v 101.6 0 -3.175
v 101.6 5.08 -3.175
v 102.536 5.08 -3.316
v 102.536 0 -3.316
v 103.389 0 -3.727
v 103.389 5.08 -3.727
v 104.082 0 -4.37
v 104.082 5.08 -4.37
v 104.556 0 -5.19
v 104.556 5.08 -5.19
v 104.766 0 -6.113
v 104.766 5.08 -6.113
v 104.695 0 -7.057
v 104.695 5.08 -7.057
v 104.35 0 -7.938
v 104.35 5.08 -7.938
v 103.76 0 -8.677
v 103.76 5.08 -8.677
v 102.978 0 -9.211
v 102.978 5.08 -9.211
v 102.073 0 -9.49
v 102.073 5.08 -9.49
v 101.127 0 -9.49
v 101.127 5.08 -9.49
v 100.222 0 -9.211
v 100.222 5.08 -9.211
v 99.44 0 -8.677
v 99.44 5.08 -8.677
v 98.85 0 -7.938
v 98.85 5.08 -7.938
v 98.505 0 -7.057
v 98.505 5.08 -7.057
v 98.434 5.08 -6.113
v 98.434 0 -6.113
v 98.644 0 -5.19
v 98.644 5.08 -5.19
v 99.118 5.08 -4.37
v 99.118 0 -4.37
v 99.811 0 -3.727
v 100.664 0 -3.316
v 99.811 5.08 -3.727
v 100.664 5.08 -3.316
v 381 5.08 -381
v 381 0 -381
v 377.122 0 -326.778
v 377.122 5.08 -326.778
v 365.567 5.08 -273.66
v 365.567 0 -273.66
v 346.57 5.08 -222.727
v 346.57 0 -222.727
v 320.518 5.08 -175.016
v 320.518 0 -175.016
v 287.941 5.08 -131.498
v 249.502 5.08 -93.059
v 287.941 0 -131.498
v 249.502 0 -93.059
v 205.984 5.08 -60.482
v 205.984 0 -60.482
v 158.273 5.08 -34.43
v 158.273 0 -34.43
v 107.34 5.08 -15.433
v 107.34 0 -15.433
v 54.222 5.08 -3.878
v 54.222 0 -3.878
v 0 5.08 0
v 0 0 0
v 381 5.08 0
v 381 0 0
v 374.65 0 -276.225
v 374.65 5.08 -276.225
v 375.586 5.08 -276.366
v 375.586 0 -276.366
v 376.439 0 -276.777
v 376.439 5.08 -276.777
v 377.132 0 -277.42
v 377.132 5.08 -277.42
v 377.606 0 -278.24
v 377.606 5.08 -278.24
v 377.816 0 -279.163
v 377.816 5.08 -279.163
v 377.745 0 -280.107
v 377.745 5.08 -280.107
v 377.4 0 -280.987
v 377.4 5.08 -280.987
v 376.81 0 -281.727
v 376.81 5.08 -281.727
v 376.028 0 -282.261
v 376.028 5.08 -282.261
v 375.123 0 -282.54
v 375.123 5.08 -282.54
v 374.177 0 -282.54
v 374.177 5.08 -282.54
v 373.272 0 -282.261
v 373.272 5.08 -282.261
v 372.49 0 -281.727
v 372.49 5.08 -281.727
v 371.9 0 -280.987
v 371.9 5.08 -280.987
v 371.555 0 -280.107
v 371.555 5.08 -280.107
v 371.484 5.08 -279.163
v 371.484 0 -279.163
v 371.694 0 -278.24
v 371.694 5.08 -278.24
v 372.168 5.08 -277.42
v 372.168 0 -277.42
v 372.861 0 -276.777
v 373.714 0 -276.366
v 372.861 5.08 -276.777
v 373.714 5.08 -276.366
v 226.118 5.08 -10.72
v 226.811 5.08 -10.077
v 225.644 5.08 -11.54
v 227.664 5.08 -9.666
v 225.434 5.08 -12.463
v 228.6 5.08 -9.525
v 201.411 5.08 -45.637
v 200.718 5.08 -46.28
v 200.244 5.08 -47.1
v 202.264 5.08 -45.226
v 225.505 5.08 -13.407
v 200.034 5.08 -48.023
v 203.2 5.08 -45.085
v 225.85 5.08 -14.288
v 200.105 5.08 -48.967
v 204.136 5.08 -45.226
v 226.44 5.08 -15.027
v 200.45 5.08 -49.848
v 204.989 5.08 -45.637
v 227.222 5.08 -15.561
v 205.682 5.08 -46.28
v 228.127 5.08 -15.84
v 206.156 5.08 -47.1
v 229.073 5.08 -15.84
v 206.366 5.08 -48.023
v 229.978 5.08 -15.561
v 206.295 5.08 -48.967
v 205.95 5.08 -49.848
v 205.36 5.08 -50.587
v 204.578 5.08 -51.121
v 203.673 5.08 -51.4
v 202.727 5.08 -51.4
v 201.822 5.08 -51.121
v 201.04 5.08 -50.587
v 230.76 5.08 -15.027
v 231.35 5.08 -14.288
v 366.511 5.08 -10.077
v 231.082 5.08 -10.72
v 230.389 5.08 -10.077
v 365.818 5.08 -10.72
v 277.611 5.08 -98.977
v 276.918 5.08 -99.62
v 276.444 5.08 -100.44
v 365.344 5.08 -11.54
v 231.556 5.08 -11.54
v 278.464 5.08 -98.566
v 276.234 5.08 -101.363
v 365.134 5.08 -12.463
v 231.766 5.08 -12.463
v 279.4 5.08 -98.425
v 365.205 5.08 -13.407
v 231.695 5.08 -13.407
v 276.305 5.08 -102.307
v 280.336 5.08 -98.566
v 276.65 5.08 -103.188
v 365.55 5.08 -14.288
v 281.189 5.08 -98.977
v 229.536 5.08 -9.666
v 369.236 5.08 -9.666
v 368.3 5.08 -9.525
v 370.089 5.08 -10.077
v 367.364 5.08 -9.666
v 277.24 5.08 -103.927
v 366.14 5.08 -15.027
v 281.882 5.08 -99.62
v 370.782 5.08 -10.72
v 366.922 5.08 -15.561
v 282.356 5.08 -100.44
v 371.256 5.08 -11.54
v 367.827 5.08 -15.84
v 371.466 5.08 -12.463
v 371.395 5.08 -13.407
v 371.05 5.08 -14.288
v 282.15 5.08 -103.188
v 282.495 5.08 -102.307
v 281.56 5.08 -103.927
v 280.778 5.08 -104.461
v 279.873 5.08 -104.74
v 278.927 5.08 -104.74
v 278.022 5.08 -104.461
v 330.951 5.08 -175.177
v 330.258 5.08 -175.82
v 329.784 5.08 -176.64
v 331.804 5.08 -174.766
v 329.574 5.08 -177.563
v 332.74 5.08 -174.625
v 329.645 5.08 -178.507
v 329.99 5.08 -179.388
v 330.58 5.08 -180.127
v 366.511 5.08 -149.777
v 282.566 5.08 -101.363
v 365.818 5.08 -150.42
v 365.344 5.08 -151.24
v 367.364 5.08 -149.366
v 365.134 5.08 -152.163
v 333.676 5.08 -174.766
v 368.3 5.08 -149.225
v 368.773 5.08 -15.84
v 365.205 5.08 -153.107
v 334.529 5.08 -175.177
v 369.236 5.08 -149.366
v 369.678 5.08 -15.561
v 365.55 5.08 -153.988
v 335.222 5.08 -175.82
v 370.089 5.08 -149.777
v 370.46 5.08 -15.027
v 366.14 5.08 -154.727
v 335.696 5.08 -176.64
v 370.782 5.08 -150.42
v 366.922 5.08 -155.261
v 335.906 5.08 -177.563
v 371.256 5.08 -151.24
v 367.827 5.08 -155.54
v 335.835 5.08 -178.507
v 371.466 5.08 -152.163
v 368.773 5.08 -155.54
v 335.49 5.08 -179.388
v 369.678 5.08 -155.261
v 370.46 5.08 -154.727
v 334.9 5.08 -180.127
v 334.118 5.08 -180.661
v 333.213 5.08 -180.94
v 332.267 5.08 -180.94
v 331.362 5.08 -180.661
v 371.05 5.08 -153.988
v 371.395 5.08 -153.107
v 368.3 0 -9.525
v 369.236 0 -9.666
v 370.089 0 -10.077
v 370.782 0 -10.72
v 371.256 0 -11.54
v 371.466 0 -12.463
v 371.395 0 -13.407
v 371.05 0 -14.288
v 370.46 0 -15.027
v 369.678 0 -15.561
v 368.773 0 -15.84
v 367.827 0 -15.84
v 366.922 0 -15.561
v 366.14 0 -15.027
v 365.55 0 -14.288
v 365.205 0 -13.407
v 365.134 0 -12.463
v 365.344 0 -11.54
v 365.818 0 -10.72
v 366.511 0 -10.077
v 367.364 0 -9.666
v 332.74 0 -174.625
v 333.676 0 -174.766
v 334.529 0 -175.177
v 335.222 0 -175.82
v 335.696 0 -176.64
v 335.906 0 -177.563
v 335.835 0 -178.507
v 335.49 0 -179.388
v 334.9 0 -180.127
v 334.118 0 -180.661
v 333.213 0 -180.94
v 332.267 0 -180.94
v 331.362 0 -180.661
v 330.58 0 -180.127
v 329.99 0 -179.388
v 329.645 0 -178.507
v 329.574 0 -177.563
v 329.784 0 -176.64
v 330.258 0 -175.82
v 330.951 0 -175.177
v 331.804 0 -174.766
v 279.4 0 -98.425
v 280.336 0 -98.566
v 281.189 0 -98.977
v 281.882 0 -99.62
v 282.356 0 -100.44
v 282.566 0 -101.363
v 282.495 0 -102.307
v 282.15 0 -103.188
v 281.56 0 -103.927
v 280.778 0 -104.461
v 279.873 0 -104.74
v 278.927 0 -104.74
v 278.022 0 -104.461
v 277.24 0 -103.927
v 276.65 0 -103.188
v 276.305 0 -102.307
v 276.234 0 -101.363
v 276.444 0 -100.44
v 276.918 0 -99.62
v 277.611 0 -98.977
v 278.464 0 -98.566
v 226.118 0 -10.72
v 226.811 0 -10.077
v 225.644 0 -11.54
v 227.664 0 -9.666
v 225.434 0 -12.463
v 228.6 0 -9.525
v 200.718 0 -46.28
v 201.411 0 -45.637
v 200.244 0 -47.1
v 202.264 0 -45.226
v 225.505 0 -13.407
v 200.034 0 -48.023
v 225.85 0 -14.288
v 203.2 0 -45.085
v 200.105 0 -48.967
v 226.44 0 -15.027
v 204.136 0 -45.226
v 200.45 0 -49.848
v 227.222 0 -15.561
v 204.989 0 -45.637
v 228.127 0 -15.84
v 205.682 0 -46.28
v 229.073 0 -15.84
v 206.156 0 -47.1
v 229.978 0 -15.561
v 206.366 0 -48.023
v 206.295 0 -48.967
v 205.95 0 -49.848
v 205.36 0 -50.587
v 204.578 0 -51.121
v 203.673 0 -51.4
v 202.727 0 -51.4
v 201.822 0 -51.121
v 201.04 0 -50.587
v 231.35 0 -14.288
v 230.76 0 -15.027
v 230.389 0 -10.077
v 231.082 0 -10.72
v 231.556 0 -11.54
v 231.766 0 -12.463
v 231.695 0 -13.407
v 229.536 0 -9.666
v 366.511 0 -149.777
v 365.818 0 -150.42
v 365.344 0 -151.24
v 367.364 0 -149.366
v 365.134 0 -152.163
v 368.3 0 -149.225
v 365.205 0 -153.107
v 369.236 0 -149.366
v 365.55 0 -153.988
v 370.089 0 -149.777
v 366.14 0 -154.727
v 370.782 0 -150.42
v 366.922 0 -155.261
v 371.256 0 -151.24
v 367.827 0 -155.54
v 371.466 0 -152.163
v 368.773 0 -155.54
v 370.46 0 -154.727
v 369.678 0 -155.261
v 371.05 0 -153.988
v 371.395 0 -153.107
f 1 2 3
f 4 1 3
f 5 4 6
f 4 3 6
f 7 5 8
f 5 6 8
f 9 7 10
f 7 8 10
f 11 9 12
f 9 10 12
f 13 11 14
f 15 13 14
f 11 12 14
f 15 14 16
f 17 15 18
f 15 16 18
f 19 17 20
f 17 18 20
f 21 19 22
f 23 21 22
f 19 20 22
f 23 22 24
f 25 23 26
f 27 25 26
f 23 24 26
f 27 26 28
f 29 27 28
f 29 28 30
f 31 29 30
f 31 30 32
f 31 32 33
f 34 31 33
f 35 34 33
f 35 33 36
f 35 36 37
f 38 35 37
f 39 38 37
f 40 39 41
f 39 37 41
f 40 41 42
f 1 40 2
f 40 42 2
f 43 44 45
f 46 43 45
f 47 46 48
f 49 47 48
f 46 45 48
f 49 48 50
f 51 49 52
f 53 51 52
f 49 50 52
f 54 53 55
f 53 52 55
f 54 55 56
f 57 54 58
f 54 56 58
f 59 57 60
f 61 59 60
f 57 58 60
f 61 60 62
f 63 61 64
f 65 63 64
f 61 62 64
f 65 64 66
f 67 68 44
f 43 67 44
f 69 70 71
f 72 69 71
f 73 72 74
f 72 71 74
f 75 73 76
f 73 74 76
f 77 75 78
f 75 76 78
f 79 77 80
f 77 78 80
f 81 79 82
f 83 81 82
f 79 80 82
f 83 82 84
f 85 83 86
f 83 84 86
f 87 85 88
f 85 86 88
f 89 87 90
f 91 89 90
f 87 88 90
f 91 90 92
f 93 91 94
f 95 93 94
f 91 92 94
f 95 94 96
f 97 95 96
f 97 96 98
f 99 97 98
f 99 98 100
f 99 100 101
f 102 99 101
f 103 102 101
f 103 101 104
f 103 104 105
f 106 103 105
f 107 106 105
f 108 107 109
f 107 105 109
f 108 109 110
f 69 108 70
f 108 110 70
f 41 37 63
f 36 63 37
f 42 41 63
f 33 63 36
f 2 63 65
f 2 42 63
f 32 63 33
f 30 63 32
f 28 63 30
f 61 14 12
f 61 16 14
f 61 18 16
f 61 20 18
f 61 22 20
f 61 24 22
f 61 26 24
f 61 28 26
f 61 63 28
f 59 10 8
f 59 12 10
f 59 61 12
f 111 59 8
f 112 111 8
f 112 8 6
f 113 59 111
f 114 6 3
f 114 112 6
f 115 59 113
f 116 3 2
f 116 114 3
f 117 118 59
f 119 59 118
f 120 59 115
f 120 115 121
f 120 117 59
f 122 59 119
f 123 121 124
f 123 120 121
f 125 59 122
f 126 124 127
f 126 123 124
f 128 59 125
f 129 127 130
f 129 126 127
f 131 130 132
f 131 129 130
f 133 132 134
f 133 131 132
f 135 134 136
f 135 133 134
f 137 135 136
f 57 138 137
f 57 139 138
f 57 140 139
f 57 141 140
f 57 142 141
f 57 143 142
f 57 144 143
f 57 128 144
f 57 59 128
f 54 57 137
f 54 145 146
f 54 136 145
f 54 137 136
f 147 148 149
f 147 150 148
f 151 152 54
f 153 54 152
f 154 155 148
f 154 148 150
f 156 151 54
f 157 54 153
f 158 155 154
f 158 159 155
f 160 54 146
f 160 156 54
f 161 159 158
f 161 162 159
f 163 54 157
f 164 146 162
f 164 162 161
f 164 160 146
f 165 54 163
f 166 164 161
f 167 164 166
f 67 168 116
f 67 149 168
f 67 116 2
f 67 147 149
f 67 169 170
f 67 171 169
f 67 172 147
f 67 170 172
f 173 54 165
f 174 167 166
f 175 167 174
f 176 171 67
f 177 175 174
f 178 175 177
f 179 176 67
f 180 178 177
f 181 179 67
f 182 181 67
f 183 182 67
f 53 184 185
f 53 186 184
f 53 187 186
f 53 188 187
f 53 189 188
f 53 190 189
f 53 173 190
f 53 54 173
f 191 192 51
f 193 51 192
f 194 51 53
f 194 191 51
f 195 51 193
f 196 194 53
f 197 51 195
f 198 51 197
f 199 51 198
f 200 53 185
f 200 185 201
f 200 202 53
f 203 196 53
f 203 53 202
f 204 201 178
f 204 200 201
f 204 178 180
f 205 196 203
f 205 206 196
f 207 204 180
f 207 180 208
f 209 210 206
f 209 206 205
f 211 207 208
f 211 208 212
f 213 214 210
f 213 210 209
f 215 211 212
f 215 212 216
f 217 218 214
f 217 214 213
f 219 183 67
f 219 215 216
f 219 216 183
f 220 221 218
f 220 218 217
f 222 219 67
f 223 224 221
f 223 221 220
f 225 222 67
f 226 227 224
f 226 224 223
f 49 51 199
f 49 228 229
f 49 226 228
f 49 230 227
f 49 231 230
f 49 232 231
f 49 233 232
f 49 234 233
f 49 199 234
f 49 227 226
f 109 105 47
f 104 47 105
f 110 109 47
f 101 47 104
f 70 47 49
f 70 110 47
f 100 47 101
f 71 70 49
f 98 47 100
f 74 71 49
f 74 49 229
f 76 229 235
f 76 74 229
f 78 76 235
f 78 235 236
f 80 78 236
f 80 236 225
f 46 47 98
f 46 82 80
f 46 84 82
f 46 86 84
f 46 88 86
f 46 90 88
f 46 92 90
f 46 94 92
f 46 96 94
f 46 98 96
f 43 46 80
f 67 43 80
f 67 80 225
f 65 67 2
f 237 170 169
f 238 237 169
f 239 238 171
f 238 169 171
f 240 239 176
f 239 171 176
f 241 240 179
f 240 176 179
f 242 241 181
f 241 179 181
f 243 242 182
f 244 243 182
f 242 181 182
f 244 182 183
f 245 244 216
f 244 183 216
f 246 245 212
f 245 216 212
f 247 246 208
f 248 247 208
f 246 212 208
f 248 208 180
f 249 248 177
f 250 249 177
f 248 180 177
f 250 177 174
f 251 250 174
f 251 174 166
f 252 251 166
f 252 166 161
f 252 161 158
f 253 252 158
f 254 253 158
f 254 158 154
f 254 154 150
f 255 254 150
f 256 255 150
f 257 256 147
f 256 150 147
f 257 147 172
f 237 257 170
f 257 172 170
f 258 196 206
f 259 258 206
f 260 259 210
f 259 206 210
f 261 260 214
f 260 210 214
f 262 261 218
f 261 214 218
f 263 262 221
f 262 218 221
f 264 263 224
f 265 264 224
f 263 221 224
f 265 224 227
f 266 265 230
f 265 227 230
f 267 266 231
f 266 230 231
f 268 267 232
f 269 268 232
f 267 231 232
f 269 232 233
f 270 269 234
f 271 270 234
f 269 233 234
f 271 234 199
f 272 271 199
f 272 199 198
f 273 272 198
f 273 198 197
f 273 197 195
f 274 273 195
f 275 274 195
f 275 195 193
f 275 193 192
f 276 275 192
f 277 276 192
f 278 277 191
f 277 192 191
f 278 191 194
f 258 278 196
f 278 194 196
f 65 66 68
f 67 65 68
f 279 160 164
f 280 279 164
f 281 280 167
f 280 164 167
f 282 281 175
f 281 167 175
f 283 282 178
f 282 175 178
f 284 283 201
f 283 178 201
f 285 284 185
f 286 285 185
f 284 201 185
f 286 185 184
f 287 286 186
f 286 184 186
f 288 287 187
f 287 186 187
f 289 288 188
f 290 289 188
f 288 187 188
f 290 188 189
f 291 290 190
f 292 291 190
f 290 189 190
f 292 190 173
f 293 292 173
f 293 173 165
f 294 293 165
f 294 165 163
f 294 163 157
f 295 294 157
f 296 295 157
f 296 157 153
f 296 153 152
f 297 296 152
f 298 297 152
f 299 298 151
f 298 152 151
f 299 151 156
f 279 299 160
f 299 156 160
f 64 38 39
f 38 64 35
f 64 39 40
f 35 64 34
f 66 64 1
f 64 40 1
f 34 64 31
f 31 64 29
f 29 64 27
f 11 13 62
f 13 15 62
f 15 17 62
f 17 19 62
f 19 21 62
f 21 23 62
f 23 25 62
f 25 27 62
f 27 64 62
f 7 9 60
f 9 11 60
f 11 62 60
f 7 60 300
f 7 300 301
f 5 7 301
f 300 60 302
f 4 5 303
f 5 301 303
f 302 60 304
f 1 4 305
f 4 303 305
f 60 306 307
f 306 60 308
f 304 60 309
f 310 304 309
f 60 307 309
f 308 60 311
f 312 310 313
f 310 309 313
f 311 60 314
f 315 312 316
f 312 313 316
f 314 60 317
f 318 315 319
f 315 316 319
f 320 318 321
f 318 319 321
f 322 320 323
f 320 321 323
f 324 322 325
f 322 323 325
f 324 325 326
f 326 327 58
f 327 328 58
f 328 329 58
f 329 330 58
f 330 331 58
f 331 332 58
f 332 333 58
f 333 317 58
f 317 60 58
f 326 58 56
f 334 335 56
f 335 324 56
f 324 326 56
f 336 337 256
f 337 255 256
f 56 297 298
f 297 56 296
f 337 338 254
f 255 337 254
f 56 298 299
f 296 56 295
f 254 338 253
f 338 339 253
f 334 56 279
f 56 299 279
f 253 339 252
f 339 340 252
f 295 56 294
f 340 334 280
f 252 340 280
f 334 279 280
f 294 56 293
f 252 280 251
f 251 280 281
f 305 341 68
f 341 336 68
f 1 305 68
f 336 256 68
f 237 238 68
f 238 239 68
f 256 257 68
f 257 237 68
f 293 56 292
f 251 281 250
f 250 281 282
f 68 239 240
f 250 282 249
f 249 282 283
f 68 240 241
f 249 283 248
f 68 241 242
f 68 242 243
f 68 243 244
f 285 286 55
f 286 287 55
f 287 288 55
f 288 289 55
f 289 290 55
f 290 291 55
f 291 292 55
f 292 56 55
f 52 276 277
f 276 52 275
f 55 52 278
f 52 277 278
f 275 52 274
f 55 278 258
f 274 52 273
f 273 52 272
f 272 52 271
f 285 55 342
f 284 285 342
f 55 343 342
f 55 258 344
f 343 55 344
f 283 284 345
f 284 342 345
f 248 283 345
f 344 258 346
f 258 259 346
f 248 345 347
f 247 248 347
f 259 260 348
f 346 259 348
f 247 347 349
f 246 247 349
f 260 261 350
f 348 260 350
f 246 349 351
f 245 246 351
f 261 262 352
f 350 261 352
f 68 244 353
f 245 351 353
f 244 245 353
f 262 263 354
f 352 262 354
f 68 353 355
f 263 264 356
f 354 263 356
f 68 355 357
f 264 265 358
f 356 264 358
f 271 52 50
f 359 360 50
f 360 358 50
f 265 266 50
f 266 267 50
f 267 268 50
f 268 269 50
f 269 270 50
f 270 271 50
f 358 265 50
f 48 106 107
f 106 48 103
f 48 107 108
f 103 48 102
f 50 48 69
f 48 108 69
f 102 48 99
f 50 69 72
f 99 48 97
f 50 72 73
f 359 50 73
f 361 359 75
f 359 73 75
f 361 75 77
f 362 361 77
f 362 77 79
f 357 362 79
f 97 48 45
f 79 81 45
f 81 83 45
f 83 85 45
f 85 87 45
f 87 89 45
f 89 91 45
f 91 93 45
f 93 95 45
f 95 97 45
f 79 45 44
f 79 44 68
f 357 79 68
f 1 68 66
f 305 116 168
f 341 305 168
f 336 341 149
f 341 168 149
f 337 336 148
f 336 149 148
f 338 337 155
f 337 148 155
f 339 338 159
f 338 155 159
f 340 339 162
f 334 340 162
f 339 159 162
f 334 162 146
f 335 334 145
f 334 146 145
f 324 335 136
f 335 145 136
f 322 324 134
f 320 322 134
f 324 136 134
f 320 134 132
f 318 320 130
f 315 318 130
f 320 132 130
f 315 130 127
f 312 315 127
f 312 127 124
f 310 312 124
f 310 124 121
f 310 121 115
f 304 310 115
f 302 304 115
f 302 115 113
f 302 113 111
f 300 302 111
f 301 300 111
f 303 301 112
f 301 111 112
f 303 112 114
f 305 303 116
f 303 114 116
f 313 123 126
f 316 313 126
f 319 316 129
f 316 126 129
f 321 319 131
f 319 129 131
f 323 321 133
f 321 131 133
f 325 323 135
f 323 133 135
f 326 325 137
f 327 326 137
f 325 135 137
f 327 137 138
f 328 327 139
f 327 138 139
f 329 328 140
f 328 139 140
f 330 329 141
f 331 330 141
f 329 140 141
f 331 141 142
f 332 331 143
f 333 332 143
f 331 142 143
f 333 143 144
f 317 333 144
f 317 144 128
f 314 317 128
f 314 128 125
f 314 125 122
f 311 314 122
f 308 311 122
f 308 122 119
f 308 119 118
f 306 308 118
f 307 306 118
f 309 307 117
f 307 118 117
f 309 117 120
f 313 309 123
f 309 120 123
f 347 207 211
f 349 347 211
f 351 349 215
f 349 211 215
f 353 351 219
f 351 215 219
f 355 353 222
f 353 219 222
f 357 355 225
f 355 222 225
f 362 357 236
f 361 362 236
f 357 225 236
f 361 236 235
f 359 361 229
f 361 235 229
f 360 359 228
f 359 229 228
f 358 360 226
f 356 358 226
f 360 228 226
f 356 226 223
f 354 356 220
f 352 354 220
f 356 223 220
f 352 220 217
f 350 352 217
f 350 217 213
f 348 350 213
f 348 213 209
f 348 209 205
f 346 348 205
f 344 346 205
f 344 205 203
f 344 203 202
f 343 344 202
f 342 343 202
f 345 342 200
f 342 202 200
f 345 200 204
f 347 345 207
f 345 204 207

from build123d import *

# Parameters (mm, degrees)
BOSS_EXTRUDE1_DEPTH = 5.08
SKETCH3_R           = 3.175
CUT_EXTRUDE1_DEPTH  = 5.08


with BuildPart() as part:
    # Sketch1 → Boss-Extrude1 (new body)
    with BuildSketch(Plane(origin=(0, 0, 0), x_dir=(1, 0, 0), z_dir=(0, 1, 0))):
        with BuildLine():
            Line((381, 0), (381, 381))
            ThreePointArc((381, 381), (269.407683632, 111.592316368), (0, 0))
            Line((0, 0), (381, 0))
        make_face()
    extrude(amount=BOSS_EXTRUDE1_DEPTH)

    # Sketch3 → Cut-Extrude1 (cut)
    with BuildSketch(Plane(origin=(0, 5.08, 0), x_dir=(1, 0, 0), z_dir=(0, 1, 0))):
        with Locations(Location((101.6, 6.35, 0), (0, 0, 270))):
            Circle(SKETCH3_R)
        with Locations(Location((374.65, 279.4, 0), (0, 0, 270))):
            Circle(SKETCH3_R)
        with Locations(Location((368.3, 12.7, 0), (0, 0, 270))):
            Circle(SKETCH3_R)
        with Locations(Location((279.4, 101.6, 0), (0, 0, 270))):
            Circle(SKETCH3_R)
        with Locations(Location((203.2, 48.26, 0), (0, 0, 270))):
            Circle(SKETCH3_R)
        with Locations(Location((332.74, 177.8, 0), (0, 0, 270))):
            Circle(SKETCH3_R)
        with Locations(Location((228.6, 12.7, 0), (0, 0, 270))):
            Circle(SKETCH3_R)
        with Locations(Location((368.3, 152.4, 0), (0, 0, 270))):
            Circle(SKETCH3_R)
    extrude(amount=-CUT_EXTRUDE1_DEPTH, mode=Mode.SUBTRACT)


solid = part.part
